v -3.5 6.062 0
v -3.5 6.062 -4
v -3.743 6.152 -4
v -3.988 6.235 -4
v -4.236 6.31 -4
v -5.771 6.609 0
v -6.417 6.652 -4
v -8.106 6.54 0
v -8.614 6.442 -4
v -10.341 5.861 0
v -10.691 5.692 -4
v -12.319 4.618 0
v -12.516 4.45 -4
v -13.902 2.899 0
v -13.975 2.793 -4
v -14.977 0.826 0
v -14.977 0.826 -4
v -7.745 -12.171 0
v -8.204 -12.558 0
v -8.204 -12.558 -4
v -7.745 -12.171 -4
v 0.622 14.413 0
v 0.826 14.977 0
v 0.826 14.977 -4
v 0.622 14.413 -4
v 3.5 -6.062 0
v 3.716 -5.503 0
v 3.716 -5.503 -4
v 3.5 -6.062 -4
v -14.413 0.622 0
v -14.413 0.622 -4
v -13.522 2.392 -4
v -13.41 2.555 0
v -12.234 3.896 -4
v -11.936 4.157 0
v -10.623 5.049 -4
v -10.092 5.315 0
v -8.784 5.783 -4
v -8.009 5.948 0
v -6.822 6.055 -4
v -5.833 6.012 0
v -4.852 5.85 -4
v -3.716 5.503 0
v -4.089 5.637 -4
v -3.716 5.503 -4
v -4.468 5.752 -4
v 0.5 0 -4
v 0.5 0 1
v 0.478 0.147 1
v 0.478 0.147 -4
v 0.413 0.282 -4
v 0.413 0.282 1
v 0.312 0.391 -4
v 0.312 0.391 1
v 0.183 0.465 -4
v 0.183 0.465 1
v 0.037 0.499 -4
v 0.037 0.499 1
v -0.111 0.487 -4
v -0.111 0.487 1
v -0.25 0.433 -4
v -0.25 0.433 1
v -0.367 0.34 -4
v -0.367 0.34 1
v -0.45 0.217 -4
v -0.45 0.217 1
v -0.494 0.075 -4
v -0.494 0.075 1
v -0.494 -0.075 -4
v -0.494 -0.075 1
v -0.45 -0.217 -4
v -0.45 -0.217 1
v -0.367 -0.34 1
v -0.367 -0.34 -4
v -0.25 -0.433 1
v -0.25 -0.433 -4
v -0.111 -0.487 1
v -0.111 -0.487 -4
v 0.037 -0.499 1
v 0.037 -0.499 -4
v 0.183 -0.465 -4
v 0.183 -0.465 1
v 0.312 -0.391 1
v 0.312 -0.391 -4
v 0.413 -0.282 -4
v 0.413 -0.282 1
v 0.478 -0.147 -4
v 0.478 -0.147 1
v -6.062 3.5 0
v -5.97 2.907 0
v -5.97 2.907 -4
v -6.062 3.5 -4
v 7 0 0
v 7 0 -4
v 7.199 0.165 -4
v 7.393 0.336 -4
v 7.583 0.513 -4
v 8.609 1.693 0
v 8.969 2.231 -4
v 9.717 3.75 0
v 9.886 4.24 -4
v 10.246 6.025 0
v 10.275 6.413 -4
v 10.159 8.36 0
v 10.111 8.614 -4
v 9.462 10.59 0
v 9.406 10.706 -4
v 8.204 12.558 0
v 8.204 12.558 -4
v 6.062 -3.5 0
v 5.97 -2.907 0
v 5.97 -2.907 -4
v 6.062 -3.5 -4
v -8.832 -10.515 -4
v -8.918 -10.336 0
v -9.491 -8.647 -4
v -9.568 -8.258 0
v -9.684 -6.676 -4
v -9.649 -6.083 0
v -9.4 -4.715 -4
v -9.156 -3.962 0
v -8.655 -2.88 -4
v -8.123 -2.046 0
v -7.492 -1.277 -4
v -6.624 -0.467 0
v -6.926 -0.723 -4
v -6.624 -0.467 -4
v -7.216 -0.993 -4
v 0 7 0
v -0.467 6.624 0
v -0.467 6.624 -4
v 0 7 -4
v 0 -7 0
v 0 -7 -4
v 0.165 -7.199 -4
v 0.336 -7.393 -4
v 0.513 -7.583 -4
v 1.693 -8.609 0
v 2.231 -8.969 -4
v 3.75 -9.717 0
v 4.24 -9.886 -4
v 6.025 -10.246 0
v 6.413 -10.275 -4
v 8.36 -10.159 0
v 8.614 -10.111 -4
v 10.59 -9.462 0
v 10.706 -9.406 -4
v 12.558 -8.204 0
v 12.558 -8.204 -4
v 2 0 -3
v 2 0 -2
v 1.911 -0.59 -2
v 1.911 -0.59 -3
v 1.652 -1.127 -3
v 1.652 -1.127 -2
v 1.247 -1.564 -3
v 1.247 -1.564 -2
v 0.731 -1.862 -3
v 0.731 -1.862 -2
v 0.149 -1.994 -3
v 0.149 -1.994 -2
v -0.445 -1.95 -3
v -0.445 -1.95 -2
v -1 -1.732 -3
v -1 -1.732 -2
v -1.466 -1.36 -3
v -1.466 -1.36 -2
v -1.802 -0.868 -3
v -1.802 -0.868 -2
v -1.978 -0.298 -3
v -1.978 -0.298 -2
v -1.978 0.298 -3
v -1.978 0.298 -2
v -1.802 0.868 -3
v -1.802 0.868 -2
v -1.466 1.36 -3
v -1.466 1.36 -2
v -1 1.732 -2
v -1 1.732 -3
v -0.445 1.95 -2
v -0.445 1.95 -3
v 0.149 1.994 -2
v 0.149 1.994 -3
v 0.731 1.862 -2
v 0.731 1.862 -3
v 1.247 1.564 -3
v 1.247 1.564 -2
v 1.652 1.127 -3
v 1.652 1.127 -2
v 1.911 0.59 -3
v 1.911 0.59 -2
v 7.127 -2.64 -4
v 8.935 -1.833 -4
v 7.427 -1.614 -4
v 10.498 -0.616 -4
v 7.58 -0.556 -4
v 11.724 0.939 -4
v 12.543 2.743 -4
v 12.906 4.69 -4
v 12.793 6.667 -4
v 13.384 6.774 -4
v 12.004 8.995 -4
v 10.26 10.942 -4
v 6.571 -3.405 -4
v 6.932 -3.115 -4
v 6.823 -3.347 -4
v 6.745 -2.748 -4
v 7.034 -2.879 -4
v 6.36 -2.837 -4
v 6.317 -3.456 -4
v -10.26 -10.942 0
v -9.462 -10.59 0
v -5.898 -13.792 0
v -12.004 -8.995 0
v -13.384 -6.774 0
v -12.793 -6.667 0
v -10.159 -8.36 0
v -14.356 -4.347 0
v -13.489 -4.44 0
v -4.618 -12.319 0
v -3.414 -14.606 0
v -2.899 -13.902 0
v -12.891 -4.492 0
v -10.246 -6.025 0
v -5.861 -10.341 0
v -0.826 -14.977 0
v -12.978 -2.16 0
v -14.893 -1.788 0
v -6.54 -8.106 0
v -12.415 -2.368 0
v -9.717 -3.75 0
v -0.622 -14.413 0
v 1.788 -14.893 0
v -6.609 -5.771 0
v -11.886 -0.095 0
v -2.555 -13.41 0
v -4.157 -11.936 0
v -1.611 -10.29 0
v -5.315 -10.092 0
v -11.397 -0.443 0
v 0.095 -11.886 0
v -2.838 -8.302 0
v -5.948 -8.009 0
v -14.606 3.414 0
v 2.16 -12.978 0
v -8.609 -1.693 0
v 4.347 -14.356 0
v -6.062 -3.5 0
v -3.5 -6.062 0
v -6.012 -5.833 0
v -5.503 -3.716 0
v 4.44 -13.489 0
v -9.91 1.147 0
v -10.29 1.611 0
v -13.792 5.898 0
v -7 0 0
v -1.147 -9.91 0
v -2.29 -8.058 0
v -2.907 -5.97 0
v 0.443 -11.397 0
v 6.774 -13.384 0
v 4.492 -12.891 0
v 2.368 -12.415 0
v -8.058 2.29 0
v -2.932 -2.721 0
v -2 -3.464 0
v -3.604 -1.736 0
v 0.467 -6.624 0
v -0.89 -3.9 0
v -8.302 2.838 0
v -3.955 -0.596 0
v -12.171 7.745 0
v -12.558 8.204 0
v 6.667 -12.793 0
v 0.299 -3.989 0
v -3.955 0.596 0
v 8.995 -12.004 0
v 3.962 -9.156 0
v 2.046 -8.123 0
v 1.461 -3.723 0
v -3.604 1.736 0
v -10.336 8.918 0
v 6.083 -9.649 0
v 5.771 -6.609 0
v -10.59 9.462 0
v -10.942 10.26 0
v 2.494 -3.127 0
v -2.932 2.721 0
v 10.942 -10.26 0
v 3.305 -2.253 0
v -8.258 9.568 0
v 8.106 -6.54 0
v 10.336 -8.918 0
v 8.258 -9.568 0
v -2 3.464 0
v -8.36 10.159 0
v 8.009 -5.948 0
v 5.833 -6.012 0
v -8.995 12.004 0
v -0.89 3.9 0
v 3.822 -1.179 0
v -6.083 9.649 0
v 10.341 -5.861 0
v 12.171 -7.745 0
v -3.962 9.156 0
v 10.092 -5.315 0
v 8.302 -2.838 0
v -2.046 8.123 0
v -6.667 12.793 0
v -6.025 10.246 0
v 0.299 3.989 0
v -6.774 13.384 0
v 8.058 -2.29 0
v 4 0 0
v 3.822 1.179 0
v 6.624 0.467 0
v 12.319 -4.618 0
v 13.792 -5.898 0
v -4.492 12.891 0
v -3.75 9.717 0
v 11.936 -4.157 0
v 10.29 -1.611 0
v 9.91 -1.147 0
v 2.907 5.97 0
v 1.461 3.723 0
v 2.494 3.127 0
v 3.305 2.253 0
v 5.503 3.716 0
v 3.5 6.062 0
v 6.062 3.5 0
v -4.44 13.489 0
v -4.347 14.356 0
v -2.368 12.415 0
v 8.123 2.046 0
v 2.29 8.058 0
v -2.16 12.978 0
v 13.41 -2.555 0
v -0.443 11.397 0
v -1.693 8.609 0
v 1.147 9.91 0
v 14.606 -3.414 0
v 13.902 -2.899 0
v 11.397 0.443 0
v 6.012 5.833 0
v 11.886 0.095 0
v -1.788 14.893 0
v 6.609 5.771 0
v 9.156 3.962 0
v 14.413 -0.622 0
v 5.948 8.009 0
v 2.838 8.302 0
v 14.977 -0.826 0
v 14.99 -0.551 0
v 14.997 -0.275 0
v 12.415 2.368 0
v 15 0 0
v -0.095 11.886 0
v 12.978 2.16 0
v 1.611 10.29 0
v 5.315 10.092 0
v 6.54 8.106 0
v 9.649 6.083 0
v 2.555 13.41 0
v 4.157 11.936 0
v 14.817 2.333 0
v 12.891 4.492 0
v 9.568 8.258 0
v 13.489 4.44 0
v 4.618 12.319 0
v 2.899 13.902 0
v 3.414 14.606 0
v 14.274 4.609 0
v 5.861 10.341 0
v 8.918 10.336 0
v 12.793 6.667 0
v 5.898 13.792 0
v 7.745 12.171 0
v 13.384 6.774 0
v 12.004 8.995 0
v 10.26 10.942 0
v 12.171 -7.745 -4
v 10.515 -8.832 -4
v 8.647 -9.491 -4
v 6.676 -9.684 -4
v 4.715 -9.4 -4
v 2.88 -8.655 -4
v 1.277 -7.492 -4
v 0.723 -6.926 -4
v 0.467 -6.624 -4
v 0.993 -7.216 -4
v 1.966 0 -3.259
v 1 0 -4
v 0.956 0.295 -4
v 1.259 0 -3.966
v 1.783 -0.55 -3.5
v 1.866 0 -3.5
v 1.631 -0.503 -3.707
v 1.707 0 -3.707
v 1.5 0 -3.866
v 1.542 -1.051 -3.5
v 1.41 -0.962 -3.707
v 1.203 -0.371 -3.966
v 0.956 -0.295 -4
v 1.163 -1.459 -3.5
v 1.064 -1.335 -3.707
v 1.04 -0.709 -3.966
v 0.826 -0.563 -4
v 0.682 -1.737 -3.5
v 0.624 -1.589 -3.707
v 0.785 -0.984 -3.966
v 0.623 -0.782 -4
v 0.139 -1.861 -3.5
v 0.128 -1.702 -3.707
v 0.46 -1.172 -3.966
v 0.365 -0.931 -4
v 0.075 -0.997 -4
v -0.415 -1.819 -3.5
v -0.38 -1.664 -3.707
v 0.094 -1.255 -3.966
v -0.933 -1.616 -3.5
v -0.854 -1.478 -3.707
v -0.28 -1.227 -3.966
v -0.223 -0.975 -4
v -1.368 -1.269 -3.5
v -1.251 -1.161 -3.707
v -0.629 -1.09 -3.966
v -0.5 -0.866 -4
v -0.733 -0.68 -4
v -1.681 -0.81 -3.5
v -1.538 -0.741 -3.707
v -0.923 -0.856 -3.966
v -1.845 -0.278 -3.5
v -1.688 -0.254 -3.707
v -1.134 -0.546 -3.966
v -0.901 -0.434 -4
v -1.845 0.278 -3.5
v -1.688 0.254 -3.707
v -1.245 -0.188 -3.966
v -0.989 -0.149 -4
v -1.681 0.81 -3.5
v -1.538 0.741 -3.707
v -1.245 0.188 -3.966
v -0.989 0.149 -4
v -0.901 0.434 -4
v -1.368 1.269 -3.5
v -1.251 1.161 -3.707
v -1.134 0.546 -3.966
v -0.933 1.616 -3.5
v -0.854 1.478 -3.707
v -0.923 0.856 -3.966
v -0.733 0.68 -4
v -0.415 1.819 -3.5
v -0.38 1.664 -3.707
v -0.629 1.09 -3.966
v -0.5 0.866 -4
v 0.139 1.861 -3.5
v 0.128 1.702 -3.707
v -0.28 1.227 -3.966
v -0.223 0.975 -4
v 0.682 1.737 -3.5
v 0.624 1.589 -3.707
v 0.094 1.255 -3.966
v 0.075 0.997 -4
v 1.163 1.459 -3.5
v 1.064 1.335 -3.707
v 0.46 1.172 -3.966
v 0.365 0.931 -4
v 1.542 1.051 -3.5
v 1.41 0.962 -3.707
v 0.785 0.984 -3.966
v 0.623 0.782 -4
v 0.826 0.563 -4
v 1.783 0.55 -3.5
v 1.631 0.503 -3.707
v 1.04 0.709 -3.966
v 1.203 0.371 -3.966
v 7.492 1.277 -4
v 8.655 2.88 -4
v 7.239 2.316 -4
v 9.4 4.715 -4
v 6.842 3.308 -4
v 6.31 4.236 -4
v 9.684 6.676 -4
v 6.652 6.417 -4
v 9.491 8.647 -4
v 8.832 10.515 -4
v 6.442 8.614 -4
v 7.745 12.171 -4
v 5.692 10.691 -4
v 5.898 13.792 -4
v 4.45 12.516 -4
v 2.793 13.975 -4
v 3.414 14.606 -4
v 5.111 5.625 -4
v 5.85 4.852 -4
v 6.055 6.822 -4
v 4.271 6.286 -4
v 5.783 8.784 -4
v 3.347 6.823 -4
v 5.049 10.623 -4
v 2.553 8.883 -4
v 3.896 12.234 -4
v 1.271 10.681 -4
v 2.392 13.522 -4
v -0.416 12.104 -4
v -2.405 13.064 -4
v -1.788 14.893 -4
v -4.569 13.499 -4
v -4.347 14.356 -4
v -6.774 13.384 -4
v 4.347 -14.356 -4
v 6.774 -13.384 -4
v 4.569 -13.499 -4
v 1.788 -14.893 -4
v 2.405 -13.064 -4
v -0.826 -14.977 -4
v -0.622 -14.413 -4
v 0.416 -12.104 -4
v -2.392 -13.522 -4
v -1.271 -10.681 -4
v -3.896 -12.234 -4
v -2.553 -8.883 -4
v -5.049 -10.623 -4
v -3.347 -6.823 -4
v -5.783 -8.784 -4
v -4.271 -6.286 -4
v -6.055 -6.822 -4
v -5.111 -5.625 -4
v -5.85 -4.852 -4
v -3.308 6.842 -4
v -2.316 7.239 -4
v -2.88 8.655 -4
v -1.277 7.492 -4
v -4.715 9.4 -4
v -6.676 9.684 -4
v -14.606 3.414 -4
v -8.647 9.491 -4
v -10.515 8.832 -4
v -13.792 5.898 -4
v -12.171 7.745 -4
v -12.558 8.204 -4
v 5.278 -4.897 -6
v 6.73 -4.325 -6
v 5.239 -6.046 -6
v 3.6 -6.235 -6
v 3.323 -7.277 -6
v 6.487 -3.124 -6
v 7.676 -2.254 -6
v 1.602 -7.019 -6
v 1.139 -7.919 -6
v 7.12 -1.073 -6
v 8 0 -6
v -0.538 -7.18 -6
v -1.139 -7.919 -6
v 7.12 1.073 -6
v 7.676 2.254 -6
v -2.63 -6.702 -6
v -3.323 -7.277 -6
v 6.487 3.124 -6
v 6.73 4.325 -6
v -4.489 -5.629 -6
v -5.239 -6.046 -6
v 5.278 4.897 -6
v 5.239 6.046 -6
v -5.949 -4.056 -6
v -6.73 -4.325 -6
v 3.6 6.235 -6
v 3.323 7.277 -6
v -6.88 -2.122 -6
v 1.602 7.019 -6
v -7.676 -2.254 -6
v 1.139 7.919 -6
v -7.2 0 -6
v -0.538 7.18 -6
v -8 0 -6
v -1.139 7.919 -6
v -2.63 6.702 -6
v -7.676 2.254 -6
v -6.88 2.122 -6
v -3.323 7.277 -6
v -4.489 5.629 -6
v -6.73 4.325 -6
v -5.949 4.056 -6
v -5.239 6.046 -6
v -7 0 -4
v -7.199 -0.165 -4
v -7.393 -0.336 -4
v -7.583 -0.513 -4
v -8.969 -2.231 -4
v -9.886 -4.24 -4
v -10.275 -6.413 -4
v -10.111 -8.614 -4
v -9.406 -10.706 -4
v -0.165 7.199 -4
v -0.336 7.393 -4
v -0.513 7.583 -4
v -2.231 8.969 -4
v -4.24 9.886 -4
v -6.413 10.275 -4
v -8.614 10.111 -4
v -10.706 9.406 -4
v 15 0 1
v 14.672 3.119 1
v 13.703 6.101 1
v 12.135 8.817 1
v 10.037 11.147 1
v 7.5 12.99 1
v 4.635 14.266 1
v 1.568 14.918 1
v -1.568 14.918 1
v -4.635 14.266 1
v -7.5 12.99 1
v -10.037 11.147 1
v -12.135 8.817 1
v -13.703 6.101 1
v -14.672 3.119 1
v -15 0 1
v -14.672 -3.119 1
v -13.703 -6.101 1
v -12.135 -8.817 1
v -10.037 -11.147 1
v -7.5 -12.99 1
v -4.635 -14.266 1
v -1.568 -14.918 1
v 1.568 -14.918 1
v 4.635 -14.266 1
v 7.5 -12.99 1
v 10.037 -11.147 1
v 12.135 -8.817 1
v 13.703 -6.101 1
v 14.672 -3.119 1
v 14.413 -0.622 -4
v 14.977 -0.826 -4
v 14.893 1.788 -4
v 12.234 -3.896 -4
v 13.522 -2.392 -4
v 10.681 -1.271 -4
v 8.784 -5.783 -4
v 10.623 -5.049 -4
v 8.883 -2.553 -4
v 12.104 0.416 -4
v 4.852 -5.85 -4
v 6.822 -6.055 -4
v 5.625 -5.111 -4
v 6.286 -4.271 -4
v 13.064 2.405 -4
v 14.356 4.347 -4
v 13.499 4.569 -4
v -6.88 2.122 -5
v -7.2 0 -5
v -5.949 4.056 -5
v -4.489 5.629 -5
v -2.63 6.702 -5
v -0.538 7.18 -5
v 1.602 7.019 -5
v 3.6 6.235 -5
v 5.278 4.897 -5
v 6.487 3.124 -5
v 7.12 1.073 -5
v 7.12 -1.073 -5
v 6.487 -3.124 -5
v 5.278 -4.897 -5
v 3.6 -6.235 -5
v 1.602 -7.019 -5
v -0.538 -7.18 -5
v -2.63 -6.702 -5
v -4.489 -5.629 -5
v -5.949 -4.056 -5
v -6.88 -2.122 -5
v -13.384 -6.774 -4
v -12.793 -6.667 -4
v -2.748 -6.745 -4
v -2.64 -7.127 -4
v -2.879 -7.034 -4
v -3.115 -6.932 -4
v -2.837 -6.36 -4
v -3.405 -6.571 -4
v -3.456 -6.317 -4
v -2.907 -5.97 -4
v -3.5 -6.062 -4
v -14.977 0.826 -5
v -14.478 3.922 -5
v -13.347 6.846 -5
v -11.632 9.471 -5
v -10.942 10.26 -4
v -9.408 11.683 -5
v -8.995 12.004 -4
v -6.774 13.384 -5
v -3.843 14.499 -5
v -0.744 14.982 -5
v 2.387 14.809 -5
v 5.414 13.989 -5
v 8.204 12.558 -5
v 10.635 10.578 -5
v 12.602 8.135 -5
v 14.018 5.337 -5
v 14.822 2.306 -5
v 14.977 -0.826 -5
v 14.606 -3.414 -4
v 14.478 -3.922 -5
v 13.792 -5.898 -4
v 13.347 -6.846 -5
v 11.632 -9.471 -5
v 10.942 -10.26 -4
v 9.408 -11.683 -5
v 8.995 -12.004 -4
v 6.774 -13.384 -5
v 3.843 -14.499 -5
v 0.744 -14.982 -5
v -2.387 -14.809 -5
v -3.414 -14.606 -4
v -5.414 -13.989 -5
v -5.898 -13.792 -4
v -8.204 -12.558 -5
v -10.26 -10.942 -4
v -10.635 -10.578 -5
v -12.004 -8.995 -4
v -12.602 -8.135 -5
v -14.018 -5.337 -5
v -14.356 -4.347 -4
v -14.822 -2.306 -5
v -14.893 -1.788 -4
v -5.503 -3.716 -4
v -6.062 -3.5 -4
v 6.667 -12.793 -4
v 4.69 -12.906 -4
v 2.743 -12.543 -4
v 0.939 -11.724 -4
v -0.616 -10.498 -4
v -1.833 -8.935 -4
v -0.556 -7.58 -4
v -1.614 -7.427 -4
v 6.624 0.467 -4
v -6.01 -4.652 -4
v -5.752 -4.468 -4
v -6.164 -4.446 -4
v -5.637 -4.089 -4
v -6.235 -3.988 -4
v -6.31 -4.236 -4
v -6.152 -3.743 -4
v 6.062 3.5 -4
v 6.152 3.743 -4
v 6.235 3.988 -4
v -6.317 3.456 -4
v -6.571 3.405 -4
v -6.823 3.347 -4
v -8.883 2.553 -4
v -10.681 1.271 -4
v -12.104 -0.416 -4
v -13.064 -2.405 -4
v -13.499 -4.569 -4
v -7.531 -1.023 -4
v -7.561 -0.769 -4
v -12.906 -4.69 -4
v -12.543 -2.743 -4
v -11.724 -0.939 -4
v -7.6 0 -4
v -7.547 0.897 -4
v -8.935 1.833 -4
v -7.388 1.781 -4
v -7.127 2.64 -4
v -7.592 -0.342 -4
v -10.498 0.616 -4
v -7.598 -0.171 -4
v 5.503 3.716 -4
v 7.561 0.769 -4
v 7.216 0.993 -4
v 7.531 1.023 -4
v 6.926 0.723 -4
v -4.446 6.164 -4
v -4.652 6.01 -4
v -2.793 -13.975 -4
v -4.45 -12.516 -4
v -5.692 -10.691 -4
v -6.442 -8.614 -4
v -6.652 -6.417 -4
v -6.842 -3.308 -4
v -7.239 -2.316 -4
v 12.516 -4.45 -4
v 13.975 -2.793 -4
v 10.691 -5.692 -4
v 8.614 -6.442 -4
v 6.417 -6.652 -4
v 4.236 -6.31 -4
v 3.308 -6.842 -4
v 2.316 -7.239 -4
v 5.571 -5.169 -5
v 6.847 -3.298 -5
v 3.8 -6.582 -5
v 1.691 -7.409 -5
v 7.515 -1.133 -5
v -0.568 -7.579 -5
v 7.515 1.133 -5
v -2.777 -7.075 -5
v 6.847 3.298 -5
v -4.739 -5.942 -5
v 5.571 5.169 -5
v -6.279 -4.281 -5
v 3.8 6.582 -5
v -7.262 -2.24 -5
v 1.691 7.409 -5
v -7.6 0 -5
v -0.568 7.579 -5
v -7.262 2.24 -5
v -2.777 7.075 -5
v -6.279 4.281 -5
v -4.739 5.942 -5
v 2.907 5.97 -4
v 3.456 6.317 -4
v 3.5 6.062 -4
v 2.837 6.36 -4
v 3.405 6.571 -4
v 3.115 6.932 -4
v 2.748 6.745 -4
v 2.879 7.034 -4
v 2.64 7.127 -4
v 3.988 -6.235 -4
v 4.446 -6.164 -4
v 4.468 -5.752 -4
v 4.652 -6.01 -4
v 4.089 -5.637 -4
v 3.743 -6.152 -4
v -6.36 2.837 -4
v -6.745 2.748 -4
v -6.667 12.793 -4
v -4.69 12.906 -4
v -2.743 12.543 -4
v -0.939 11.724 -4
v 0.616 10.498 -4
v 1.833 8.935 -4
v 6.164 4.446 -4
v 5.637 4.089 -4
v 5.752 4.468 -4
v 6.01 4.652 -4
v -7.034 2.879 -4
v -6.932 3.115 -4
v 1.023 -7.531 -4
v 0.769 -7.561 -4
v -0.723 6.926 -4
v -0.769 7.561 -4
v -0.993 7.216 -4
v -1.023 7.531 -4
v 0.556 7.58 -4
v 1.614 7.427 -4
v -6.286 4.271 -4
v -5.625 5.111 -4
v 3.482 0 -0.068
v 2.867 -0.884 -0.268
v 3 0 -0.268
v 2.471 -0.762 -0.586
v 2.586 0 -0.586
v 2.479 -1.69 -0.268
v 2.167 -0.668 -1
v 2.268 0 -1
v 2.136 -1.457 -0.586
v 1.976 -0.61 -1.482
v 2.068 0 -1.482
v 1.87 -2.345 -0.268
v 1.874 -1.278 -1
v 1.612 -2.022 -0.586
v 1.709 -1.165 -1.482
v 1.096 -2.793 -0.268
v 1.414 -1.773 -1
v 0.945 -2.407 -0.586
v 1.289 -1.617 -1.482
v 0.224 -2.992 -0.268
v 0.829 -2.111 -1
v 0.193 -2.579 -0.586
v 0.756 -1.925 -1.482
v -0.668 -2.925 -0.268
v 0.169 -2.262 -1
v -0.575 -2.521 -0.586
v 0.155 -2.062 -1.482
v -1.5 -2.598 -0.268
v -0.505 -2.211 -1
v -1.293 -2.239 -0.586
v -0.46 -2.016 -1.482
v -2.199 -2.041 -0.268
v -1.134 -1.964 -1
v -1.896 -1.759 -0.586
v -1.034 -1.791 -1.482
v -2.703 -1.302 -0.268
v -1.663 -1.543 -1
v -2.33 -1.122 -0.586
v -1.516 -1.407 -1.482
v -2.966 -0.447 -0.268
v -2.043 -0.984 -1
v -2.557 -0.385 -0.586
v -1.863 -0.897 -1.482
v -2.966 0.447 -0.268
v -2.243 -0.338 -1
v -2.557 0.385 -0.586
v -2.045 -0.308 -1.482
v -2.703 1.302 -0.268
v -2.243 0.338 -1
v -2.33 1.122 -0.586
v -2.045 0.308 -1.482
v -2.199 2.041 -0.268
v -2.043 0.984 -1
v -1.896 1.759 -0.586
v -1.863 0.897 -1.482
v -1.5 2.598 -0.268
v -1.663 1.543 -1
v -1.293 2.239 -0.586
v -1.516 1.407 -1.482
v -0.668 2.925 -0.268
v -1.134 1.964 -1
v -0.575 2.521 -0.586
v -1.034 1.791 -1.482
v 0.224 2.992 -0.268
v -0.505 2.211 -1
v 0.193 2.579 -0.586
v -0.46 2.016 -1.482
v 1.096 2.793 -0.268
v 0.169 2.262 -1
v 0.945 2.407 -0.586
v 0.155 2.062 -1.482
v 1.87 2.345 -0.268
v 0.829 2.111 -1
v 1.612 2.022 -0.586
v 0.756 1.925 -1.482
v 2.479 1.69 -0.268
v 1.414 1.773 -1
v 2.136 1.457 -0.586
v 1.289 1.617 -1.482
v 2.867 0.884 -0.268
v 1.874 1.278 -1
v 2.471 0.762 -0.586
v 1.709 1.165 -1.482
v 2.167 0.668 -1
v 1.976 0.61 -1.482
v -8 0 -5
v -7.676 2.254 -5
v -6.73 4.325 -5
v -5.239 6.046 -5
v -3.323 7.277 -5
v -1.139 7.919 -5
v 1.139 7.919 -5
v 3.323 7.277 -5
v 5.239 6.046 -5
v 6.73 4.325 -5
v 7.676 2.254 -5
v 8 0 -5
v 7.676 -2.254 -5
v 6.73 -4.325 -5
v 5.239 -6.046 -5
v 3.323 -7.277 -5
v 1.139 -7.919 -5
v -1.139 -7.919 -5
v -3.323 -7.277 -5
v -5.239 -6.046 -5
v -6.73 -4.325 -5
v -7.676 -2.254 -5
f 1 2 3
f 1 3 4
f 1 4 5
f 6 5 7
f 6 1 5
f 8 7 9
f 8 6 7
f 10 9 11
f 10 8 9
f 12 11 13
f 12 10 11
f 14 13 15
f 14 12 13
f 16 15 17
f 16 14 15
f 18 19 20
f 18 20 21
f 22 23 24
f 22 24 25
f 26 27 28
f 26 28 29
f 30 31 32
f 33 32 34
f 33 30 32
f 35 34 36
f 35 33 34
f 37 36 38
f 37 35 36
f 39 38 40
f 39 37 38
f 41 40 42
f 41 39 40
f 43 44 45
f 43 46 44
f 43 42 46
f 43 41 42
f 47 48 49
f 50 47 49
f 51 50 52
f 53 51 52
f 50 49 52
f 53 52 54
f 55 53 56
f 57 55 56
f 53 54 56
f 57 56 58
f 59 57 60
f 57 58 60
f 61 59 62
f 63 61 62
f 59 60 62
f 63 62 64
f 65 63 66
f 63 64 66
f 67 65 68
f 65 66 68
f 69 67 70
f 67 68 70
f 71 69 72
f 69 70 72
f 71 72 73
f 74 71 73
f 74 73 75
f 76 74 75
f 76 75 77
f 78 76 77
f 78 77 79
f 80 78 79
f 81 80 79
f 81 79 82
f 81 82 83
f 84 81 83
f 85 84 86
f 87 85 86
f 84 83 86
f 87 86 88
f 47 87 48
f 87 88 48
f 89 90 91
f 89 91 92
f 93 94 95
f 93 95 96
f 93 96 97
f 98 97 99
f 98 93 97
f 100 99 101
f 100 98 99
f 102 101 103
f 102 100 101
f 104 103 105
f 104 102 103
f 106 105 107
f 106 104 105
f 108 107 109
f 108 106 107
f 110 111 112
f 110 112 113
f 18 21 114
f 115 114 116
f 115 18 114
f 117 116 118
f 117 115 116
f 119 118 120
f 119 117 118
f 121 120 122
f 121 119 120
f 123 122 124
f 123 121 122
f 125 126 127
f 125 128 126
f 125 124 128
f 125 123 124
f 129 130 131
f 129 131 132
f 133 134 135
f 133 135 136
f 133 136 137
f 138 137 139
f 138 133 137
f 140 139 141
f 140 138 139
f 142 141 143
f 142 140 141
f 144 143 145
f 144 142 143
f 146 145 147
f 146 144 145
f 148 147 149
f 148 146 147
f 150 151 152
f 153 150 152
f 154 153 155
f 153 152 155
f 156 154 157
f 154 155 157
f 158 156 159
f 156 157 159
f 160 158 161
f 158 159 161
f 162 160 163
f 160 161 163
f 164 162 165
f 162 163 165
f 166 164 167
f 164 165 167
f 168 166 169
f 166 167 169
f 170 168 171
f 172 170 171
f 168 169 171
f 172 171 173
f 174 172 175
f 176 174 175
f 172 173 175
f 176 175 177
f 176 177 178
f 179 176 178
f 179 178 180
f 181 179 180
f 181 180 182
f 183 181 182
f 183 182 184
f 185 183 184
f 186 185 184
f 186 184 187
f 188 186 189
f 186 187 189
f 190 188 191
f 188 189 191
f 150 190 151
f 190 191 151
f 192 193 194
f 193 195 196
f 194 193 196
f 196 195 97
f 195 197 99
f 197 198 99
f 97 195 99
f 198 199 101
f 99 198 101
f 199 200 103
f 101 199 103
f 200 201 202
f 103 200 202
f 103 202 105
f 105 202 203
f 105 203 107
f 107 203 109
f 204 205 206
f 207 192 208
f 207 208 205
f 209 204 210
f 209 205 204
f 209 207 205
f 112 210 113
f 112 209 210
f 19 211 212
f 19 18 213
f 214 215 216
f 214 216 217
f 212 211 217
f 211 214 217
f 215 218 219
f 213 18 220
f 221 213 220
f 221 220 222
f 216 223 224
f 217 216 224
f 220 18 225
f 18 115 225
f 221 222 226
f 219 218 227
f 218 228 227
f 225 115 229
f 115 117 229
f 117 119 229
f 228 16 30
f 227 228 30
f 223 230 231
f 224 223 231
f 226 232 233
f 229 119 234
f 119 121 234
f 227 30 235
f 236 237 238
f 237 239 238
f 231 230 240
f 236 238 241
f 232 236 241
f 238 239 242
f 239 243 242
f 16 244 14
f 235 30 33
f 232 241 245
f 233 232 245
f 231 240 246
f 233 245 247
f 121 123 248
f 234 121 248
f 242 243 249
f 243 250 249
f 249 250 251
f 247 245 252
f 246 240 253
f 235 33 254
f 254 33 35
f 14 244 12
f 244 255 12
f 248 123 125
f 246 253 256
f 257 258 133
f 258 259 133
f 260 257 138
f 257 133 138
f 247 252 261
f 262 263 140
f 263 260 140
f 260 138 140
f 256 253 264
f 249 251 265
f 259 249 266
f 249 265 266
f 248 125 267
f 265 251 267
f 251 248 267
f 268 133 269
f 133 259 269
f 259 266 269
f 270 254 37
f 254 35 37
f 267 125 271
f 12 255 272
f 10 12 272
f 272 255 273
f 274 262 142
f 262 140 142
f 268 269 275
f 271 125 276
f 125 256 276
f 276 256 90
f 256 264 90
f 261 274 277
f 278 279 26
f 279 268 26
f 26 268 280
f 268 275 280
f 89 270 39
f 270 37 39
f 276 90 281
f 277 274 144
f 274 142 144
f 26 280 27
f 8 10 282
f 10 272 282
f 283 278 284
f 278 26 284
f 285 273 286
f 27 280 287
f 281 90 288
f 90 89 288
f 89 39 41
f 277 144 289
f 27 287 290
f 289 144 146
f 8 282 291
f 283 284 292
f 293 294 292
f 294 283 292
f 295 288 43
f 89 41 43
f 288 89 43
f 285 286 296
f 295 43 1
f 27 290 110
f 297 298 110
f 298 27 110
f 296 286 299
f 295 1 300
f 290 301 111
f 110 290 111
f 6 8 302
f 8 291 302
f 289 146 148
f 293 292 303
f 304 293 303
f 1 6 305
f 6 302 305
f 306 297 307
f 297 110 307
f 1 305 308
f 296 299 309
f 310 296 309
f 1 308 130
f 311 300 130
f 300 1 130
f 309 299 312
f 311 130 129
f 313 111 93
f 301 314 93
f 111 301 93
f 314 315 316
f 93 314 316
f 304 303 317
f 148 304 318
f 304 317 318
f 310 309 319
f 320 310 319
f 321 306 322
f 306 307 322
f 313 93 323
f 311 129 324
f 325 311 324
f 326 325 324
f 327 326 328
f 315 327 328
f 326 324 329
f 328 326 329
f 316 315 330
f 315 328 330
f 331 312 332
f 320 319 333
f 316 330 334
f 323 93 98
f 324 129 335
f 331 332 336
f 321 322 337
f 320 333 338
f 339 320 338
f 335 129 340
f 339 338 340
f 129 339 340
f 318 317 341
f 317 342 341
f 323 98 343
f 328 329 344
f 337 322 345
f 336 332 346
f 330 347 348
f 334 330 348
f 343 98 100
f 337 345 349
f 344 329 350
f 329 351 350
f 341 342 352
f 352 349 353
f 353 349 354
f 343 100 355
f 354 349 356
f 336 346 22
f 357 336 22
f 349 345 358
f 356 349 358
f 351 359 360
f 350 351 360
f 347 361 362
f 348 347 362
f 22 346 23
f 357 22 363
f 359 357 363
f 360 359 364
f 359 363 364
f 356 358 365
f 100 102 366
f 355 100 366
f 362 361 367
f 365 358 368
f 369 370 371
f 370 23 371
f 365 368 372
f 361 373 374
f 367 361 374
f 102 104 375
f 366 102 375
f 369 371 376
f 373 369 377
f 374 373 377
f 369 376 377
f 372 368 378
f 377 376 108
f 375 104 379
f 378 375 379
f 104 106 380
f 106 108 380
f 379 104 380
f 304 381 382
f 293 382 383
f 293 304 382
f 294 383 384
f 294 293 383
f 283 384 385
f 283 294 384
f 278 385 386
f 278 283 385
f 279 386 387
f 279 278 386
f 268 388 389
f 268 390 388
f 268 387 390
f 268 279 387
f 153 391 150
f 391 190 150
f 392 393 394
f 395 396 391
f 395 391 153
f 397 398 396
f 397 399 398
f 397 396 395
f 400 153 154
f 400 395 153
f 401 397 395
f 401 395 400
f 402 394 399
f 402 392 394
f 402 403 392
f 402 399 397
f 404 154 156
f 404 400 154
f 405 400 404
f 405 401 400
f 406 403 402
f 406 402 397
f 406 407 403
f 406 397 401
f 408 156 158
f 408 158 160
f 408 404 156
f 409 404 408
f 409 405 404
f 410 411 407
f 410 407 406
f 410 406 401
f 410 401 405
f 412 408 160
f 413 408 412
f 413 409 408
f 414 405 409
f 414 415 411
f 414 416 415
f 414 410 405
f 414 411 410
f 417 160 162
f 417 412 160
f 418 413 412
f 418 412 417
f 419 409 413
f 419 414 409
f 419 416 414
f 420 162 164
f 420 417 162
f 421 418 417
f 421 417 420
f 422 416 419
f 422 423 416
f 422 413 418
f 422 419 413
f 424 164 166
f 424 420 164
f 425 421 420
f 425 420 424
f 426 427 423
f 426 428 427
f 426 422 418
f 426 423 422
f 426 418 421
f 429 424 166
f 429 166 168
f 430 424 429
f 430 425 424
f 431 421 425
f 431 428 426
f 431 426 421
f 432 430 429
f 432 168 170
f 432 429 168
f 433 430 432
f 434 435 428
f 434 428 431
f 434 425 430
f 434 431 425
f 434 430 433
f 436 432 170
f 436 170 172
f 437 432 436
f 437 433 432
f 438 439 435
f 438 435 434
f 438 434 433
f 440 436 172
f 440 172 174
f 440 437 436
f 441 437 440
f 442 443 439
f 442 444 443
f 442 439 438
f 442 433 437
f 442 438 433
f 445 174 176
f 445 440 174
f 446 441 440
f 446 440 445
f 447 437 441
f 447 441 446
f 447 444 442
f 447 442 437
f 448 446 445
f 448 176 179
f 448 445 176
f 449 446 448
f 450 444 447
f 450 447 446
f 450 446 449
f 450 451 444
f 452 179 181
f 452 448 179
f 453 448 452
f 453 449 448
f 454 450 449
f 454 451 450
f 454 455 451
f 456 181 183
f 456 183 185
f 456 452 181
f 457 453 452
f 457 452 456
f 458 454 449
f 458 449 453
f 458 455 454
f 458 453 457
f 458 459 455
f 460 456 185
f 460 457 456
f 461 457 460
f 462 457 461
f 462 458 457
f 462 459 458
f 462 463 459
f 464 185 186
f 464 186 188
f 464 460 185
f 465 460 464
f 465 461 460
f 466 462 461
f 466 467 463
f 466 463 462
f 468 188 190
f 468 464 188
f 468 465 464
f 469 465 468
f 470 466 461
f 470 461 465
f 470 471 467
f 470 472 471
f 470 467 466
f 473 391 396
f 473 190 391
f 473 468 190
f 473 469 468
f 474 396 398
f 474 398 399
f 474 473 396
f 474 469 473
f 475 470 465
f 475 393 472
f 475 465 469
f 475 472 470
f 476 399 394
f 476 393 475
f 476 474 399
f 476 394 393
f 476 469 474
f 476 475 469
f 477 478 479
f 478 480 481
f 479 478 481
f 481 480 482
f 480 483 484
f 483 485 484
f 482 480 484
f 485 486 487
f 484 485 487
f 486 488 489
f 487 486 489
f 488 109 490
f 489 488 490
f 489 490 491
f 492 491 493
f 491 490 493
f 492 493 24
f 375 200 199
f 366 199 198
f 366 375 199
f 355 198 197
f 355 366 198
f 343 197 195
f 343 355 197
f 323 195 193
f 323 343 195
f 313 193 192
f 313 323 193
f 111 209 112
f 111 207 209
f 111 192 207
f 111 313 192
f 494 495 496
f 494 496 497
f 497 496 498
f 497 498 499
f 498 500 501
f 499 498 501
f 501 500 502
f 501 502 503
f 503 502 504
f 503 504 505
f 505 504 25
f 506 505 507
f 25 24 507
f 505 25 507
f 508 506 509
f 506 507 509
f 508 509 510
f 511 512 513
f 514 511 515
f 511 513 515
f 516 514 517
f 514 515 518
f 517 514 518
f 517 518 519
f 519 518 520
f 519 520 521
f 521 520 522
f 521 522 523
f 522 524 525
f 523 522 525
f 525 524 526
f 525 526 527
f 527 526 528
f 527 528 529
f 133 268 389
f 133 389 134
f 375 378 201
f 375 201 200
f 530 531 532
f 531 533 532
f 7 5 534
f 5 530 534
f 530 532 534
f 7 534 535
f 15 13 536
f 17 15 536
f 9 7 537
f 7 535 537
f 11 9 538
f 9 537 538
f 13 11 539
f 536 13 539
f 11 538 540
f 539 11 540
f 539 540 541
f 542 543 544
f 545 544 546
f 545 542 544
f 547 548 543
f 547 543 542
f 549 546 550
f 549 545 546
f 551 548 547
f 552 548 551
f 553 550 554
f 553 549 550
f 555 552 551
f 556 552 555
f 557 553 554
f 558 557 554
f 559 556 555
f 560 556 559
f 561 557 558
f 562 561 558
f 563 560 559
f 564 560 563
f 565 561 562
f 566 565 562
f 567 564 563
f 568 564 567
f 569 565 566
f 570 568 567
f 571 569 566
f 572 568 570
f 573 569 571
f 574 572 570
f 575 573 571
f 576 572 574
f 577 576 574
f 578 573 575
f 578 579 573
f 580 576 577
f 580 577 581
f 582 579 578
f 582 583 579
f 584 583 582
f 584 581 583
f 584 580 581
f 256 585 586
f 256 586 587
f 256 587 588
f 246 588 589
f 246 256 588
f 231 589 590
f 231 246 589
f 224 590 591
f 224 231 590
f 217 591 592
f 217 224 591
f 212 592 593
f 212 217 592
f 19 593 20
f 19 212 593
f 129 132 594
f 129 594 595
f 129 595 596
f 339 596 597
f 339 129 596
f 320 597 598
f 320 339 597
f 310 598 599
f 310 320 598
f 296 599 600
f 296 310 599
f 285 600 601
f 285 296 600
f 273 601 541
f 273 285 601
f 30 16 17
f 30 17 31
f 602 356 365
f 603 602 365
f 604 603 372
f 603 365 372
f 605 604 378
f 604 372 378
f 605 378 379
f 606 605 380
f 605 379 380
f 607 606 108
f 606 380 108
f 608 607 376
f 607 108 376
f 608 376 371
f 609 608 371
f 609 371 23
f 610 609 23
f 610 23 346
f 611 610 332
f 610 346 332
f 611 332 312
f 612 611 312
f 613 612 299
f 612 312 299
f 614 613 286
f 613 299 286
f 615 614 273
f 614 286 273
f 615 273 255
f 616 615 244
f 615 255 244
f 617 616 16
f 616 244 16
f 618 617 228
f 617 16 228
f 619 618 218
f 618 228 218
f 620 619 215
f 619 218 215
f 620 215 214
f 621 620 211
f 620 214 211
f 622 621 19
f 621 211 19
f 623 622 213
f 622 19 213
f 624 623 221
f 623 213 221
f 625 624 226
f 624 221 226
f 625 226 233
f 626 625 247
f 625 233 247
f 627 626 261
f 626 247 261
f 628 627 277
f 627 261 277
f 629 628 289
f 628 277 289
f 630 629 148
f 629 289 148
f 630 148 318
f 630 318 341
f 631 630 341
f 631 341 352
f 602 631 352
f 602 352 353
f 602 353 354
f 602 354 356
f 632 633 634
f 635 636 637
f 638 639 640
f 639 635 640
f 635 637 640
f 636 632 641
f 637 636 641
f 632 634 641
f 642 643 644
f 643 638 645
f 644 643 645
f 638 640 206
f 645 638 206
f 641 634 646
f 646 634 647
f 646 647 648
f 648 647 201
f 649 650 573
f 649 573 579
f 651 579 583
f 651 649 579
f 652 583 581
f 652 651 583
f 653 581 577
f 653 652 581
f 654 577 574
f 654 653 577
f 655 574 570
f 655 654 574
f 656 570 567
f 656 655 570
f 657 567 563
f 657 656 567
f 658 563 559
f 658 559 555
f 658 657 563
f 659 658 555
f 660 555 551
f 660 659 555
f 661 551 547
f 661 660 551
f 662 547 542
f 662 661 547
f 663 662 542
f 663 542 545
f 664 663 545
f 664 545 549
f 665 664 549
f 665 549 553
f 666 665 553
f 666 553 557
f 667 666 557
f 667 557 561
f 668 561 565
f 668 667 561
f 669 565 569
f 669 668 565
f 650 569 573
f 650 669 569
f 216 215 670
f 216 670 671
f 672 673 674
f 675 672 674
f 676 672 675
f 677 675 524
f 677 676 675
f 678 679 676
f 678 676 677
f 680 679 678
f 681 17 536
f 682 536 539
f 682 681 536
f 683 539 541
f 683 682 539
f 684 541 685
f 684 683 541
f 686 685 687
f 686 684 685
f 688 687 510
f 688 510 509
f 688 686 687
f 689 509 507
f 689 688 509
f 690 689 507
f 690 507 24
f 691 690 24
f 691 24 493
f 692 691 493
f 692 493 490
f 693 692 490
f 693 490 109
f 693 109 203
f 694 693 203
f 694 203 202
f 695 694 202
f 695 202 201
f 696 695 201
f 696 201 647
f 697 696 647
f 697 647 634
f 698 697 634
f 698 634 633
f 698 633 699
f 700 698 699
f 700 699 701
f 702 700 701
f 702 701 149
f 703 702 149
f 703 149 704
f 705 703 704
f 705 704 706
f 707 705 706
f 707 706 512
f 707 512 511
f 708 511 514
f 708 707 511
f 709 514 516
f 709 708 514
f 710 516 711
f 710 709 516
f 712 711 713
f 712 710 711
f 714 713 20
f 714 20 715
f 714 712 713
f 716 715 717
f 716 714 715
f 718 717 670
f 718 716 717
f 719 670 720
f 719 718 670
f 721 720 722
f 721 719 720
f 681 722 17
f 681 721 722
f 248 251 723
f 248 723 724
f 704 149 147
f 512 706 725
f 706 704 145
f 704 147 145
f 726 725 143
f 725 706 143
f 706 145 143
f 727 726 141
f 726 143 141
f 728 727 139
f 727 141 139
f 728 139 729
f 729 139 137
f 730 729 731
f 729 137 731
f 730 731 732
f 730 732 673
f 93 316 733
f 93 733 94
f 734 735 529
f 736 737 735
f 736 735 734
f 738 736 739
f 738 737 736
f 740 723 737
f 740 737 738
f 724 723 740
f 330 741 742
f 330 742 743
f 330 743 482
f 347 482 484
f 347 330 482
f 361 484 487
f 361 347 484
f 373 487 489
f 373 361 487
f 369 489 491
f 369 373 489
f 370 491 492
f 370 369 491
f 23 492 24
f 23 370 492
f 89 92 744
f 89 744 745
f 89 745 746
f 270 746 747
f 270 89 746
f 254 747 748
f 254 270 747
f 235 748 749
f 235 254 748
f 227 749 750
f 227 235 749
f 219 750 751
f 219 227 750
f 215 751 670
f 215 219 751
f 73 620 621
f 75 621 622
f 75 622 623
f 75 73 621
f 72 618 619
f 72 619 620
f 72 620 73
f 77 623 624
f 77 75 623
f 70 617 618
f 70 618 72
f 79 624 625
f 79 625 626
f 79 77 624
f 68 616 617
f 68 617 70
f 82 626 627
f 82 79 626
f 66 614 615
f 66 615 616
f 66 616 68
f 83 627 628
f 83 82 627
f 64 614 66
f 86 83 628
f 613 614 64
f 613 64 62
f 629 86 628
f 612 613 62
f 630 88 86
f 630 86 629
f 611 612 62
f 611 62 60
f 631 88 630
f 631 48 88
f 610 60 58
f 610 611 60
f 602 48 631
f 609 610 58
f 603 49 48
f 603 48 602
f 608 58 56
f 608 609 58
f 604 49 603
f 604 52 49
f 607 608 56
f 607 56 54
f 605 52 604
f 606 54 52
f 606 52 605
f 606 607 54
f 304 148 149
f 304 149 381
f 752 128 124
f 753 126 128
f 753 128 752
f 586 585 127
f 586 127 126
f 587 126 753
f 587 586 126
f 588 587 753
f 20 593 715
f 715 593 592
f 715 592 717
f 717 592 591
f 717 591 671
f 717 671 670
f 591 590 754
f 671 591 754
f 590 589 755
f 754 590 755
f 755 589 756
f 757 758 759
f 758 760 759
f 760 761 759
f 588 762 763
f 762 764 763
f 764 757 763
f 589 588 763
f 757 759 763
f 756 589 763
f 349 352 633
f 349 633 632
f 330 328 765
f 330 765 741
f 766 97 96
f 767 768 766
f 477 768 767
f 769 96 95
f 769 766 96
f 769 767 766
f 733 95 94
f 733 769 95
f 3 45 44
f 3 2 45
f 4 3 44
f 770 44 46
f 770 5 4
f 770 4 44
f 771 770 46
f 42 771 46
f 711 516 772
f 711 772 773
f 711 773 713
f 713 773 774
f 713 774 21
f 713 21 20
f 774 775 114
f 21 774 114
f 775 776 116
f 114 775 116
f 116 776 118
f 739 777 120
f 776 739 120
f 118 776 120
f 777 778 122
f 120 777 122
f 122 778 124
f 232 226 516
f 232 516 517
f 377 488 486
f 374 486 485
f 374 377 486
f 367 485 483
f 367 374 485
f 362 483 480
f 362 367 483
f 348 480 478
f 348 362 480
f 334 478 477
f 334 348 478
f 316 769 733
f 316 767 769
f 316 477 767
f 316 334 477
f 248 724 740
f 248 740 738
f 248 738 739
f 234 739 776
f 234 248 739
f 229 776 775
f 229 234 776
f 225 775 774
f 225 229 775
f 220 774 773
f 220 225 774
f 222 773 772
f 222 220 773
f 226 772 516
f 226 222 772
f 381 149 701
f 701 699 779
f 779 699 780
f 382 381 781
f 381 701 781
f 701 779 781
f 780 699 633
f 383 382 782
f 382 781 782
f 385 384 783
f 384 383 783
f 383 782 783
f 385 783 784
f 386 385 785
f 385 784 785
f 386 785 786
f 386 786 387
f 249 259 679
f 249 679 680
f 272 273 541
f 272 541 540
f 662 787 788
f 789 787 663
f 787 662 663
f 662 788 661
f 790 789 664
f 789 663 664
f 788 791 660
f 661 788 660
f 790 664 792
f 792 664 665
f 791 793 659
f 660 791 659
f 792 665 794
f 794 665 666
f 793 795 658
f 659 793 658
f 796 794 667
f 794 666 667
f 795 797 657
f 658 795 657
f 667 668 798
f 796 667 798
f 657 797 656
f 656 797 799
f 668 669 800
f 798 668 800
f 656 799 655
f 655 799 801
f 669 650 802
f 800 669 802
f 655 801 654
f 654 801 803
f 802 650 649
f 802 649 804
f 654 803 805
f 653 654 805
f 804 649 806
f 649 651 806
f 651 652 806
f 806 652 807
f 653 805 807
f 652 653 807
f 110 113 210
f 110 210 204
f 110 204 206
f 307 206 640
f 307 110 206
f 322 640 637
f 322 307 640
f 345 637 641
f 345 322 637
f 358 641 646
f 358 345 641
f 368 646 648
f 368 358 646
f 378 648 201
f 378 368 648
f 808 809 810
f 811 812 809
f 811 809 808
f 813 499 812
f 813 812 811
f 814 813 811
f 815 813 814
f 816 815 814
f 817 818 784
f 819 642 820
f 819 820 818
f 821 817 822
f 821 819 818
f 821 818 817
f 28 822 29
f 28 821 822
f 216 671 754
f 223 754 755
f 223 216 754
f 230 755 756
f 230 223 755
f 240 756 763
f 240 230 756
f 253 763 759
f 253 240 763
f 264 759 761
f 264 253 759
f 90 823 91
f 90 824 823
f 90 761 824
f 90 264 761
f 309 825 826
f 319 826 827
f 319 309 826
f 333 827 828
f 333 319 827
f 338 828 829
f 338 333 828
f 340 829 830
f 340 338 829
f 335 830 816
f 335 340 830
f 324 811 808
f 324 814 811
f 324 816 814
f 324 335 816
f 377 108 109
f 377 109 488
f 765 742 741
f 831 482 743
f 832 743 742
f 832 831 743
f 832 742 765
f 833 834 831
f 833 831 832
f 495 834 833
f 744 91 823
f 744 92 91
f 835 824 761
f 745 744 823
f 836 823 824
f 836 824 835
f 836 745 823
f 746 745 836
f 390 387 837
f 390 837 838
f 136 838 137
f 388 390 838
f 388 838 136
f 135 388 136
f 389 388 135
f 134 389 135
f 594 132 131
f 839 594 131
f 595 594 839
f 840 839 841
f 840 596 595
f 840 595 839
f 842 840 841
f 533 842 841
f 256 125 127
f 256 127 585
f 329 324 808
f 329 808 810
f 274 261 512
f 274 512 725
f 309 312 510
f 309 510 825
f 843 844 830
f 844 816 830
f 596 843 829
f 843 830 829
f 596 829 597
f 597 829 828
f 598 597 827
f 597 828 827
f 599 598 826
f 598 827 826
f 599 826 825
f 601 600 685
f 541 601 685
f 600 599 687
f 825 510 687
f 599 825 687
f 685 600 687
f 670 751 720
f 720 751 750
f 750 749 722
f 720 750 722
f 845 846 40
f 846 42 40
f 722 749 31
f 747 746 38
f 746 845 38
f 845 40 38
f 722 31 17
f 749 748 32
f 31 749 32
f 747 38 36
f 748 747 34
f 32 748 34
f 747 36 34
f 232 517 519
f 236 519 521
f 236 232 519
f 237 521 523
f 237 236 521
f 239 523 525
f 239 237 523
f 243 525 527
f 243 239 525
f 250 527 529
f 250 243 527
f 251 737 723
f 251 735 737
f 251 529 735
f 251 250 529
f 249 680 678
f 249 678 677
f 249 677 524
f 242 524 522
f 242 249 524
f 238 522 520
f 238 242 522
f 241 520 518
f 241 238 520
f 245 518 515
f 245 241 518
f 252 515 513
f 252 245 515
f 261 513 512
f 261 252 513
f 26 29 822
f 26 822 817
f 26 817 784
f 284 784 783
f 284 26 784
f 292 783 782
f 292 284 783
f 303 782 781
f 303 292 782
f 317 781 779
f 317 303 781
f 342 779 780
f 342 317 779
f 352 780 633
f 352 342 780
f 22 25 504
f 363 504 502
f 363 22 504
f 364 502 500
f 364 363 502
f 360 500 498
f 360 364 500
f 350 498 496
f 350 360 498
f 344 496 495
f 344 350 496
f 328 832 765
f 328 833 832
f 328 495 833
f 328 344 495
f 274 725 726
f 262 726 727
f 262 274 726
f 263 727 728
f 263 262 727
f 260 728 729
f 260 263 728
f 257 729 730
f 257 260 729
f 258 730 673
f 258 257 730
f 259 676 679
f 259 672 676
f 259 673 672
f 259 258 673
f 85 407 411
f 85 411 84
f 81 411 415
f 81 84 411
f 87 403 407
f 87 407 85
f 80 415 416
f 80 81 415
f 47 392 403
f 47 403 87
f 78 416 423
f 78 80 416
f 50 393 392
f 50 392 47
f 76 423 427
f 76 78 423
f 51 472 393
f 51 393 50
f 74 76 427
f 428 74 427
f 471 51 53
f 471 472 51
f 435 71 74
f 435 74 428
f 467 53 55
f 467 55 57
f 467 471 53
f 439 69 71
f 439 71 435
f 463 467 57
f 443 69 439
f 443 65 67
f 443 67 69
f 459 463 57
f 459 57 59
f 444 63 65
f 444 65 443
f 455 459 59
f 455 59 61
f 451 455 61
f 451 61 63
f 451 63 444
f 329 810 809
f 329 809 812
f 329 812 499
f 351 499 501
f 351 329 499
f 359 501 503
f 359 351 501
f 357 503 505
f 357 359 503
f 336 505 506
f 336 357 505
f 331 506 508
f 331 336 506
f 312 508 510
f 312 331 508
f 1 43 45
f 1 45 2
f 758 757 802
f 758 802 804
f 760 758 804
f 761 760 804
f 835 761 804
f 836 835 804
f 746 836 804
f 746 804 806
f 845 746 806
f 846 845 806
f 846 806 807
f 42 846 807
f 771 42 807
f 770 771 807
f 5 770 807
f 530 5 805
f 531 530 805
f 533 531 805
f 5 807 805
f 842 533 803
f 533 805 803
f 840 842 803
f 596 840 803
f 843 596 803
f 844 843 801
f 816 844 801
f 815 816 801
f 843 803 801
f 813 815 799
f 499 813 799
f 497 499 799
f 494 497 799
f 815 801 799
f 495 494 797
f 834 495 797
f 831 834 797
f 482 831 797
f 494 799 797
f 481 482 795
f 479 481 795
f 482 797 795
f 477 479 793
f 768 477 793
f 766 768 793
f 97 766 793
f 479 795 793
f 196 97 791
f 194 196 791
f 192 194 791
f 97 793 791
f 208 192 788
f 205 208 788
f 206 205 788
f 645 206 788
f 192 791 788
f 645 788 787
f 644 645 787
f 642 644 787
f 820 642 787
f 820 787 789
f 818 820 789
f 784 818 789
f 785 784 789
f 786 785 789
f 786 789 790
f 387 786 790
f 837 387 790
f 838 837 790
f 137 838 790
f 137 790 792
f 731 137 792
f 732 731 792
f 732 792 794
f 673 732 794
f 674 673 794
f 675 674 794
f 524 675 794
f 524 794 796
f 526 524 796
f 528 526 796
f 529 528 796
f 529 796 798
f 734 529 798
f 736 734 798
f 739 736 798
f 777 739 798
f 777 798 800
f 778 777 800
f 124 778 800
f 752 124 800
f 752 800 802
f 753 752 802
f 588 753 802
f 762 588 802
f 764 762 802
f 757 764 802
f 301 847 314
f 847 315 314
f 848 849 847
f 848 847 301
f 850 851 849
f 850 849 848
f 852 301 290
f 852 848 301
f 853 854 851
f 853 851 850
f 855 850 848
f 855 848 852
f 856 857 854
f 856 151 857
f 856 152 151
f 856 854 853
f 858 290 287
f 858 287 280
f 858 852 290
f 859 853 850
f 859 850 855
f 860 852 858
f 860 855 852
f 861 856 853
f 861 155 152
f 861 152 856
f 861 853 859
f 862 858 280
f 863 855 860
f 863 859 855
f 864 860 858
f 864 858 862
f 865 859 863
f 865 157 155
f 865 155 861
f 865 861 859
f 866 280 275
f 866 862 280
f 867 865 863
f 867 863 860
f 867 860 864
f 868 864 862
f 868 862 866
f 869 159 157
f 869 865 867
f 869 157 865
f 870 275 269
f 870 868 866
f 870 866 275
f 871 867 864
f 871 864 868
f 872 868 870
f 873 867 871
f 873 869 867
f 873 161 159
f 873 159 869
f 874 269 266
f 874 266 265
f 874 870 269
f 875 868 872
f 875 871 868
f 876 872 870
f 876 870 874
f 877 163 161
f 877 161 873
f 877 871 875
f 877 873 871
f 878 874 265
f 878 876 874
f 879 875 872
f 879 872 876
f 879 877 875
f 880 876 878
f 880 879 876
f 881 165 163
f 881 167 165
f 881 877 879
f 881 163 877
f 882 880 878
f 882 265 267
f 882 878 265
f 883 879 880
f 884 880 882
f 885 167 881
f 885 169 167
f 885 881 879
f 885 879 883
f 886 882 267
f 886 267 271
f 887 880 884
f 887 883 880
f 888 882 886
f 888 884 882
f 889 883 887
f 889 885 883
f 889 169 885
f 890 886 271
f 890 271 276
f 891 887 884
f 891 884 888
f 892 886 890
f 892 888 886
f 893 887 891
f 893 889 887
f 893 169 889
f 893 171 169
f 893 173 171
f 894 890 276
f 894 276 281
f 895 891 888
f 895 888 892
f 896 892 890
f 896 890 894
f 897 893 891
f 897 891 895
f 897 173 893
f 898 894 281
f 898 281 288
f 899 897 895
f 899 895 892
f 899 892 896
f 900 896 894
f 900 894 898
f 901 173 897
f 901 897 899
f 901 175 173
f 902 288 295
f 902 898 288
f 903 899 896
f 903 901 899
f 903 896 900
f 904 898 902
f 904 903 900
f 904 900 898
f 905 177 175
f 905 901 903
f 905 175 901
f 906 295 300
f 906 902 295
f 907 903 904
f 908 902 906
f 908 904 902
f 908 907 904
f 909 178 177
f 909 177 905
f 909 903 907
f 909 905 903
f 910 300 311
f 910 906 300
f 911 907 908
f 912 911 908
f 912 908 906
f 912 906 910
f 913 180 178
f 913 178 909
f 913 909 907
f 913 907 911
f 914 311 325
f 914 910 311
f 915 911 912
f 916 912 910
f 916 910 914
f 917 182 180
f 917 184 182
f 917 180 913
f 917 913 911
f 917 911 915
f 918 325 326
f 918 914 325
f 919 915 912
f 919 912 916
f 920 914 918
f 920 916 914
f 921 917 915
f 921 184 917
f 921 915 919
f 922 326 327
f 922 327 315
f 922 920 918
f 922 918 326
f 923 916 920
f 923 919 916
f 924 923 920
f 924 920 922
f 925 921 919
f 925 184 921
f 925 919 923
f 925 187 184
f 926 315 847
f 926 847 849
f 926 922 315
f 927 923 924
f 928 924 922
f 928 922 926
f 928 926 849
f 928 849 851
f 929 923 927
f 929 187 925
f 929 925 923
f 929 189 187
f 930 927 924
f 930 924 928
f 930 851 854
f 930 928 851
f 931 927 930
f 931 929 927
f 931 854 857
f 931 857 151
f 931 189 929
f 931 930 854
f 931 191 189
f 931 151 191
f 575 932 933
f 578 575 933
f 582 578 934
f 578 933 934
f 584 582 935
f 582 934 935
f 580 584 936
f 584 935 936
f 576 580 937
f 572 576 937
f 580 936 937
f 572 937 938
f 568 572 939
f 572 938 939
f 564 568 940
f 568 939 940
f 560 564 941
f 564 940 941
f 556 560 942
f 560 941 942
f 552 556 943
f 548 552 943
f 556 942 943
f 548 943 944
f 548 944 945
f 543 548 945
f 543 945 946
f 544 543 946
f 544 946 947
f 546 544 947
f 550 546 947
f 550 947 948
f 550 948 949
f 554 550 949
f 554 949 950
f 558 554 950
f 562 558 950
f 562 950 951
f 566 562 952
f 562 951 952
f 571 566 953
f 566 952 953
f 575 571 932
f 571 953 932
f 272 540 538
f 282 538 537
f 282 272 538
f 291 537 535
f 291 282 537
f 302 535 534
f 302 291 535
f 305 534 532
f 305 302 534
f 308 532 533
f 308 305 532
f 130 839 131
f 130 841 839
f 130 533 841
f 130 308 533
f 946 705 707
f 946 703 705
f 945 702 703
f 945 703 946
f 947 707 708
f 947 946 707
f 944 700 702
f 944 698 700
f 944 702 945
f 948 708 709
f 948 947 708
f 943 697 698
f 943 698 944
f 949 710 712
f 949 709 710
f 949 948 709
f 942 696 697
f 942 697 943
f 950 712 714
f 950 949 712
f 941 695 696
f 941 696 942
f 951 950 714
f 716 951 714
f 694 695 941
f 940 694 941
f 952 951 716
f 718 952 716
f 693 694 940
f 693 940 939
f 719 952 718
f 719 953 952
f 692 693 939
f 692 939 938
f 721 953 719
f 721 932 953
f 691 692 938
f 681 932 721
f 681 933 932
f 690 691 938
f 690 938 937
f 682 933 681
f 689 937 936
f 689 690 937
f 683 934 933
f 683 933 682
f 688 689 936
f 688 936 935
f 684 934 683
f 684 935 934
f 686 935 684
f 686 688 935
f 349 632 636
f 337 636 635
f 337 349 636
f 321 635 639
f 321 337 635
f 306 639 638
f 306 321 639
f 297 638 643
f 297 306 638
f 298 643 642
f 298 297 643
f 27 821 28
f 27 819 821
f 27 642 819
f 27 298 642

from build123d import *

# Parameters (mm, degrees)
SKETCH_1_R          = 15
EXTRUDE_1_DEPTH     = 1
EXTRUDE_4_DEPTH     = 5
SKETCH_3_R          = 2
EXTRUDE_2_DEPTH     = 4
FILLET_1_R          = 2
FILLET_2_R          = 1
SKETCH_4_R          = 0.5
CUT_EXTRUDE_1_DEPTH = 5
SKETCH_5_R          = 15
EXTRUDE_3_DEPTH     = 1
SKETCH_6_R          = 8
SKETCH_6_R_2        = 7.2
EXTRUDE_4_2_DEPTH   = 1
SKETCH_7_R          = 7.6
CUT_EXTRUDE_2_DEPTH = 1


with BuildPart() as part:
    # 草图1 → 凸台-拉伸1 (new body)
    with BuildSketch(Plane.XY):
        Circle(SKETCH_1_R)
    extrude(amount=EXTRUDE_1_DEPTH)

    # 草图2 → Extrude 4 (add)
    with BuildSketch(Plane(origin=(0, 0, 0), x_dir=(-1, 0, 0), z_dir=(0, 0, -1))):
        with BuildLine():
            ThreePointArc((0, 7), (6.025450773, 10.246079868), (12.557822256, 8.203724775))
            Line((12.557822256, 8.203724775), (12.170554132, 7.745441675))
            ThreePointArc((12.170554132, 7.745441675), (6.082701111, 9.648817447), (0.467273577, 6.623628635))
            Line((0.467273577, 6.623628635), (0, 7))
        make_face()
        with BuildLine():
            ThreePointArc((3.5, 6.062177826), (10.341233372, 5.860640068), (14.977255477, 0.825722933))
            Line((14.977255477, 0.825722933), (14.412729894, 0.622472188))
            ThreePointArc((14.412729894, 0.622472188), (10.092182409, 5.31477047), (3.716485105, 5.502593875))
            Line((3.716485105, 5.502593875), (3.5, 6.062177826))
        make_face()
        with BuildLine():
            ThreePointArc((6.062177826, 3.5), (11.886090841, -0.095153505), (13.383545189, -6.773530702))
            Line((13.383545189, -6.773530702), (12.79302632, -6.667288219))
            ThreePointArc((12.79302632, -6.667288219), (11.397471581, -0.443364962), (5.969867451, 2.907143529))
            Line((5.969867451, 2.907143529), (6.062177826, 3.5))
        make_face()
        with BuildLine():
            ThreePointArc((7, 0), (10.246079868, -6.025450773), (8.203724775, -12.557822256))
            Line((8.203724775, -12.557822256), (7.745441675, -12.170554132))
            ThreePointArc((7.745441675, -12.170554132), (9.648817447, -6.082701111), (6.623628635, -0.467273577))
            Line((6.623628635, -0.467273577), (7, 0))
        make_face()
        with BuildLine():
            ThreePointArc((6.062177826, -3.5), (5.860640068, -10.341233372), (0.825722933, -14.977255477))
            Line((0.825722933, -14.977255477), (0.622472188, -14.412729894))
            ThreePointArc((0.622472188, -14.412729894), (5.31477047, -10.092182409), (5.502593875, -3.716485105))
            Line((5.502593875, -3.716485105), (6.062177826, -3.5))
        make_face()
        with BuildLine():
            ThreePointArc((3.5, -6.062177826), (-0.095153505, -11.886090841), (-6.773530702, -13.383545189))
            Line((-6.773530702, -13.383545189), (-6.667288219, -12.79302632))
            ThreePointArc((-6.667288219, -12.79302632), (-0.443364962, -11.397471581), (2.907143529, -5.969867451))
            Line((2.907143529, -5.969867451), (3.5, -6.062177826))
        make_face()
        with BuildLine():
            ThreePointArc((0, -7), (-6.025450773, -10.246079868), (-12.557822256, -8.203724775))
            Line((-12.557822256, -8.203724775), (-12.170554132, -7.745441675))
            ThreePointArc((-12.170554132, -7.745441675), (-6.082701111, -9.648817447), (-0.467273577, -6.623628635))
            Line((-0.467273577, -6.623628635), (0, -7))
        make_face()
        with BuildLine():
            ThreePointArc((-3.5, -6.062177826), (-10.341233372, -5.860640068), (-14.977255477, -0.825722933))
            Line((-14.977255477, -0.825722933), (-14.412729894, -0.622472188))
            ThreePointArc((-14.412729894, -0.622472188), (-10.092182409, -5.31477047), (-3.716485105, -5.502593875))
            Line((-3.716485105, -5.502593875), (-3.5, -6.062177826))
        make_face()
        with BuildLine():
            ThreePointArc((-6.062177826, -3.5), (-11.886090841, 0.095153505), (-13.383545189, 6.773530702))
            Line((-13.383545189, 6.773530702), (-12.79302632, 6.667288219))
            ThreePointArc((-12.79302632, 6.667288219), (-11.397471581, 0.443364962), (-5.969867451, -2.907143529))
            Line((-5.969867451, -2.907143529), (-6.062177826, -3.5))
        make_face()
        with BuildLine():
            ThreePointArc((-7, 0), (-10.246079868, 6.025450773), (-8.203724775, 12.557822256))
            Line((-8.203724775, 12.557822256), (-7.745441675, 12.170554132))
            ThreePointArc((-7.745441675, 12.170554132), (-9.648817447, 6.082701111), (-6.623628635, 0.467273577))
            Line((-6.623628635, 0.467273577), (-7, 0))
        make_face()
        with BuildLine():
            ThreePointArc((-6.062177826, 3.5), (-5.860640068, 10.341233372), (-0.825722933, 14.977255477))
            Line((-0.825722933, 14.977255477), (-0.622472188, 14.412729894))
            ThreePointArc((-0.622472188, 14.412729894), (-5.31477047, 10.092182409), (-5.502593875, 3.716485105))
            Line((-5.502593875, 3.716485105), (-6.062177826, 3.5))
        make_face()
        with BuildLine():
            ThreePointArc((-3.5, 6.062177826), (0.095153505, 11.886090841), (6.773530702, 13.383545189))
            Line((6.773530702, 13.383545189), (6.667288219, 12.79302632))
            ThreePointArc((6.667288219, 12.79302632), (0.443364962, 11.397471581), (-2.907143529, 5.969867451))
            Line((-2.907143529, 5.969867451), (-3.5, 6.062177826))
        make_face()
    extrude(amount=EXTRUDE_4_DEPTH)

    # 草图3 → 凸台-拉伸2 (add)
    with BuildSketch(Plane(origin=(0, 0, 0), x_dir=(-1, 0, 0), z_dir=(0, 0, -1))):
        with Locations(Location((0, 0, 0), (0, 0, 180))):
            Circle(SKETCH_3_R)
    extrude(amount=EXTRUDE_2_DEPTH)

    # 圆角1
    fillet_1_edges = [part.edges().sort_by_distance(p)[0] for p in [
        (-2, 0, 0),
    ]]
    fillet(fillet_1_edges, radius=FILLET_1_R)

    # 圆角2
    fillet_2_edges = [part.edges().sort_by_distance(p)[0] for p in [
        (-2, 0, -4),
    ]]
    fillet(fillet_2_edges, radius=FILLET_2_R)

    # 草图4 → 切除-拉伸1 (cut)
    with BuildSketch(Plane.XY.offset(1)):
        Circle(SKETCH_4_R)
    extrude(amount=-CUT_EXTRUDE_1_DEPTH, mode=Mode.SUBTRACT)

    # 草图5 → 凸台-拉伸3 (add)
    with BuildSketch(Plane(origin=(0, 0, -5), x_dir=(-1, 0, 0), z_dir=(0, 0, -1))):
        with Locations(Location((0, 0, 0), (0, 0, 3.155624395))):
            Circle(SKETCH_5_R)
    extrude(amount=-EXTRUDE_3_DEPTH)

    # 草图6 → Extrude 4 2 (add)
    with BuildSketch(Plane(origin=(0, 0, -5), x_dir=(-1, 0, 0), z_dir=(0, 0, -1))):
        Circle(SKETCH_6_R)
        Circle(SKETCH_6_R_2, mode=Mode.SUBTRACT)
    extrude(amount=EXTRUDE_4_2_DEPTH)

    # 草图7 → 切除-拉伸2 (cut)
    with BuildSketch(Plane(origin=(0, 0, -5), x_dir=(-1, 0, 0), z_dir=(0, 0, -1))):
        Circle(SKETCH_7_R)
    extrude(amount=-CUT_EXTRUDE_2_DEPTH, mode=Mode.SUBTRACT)


solid = part.part
